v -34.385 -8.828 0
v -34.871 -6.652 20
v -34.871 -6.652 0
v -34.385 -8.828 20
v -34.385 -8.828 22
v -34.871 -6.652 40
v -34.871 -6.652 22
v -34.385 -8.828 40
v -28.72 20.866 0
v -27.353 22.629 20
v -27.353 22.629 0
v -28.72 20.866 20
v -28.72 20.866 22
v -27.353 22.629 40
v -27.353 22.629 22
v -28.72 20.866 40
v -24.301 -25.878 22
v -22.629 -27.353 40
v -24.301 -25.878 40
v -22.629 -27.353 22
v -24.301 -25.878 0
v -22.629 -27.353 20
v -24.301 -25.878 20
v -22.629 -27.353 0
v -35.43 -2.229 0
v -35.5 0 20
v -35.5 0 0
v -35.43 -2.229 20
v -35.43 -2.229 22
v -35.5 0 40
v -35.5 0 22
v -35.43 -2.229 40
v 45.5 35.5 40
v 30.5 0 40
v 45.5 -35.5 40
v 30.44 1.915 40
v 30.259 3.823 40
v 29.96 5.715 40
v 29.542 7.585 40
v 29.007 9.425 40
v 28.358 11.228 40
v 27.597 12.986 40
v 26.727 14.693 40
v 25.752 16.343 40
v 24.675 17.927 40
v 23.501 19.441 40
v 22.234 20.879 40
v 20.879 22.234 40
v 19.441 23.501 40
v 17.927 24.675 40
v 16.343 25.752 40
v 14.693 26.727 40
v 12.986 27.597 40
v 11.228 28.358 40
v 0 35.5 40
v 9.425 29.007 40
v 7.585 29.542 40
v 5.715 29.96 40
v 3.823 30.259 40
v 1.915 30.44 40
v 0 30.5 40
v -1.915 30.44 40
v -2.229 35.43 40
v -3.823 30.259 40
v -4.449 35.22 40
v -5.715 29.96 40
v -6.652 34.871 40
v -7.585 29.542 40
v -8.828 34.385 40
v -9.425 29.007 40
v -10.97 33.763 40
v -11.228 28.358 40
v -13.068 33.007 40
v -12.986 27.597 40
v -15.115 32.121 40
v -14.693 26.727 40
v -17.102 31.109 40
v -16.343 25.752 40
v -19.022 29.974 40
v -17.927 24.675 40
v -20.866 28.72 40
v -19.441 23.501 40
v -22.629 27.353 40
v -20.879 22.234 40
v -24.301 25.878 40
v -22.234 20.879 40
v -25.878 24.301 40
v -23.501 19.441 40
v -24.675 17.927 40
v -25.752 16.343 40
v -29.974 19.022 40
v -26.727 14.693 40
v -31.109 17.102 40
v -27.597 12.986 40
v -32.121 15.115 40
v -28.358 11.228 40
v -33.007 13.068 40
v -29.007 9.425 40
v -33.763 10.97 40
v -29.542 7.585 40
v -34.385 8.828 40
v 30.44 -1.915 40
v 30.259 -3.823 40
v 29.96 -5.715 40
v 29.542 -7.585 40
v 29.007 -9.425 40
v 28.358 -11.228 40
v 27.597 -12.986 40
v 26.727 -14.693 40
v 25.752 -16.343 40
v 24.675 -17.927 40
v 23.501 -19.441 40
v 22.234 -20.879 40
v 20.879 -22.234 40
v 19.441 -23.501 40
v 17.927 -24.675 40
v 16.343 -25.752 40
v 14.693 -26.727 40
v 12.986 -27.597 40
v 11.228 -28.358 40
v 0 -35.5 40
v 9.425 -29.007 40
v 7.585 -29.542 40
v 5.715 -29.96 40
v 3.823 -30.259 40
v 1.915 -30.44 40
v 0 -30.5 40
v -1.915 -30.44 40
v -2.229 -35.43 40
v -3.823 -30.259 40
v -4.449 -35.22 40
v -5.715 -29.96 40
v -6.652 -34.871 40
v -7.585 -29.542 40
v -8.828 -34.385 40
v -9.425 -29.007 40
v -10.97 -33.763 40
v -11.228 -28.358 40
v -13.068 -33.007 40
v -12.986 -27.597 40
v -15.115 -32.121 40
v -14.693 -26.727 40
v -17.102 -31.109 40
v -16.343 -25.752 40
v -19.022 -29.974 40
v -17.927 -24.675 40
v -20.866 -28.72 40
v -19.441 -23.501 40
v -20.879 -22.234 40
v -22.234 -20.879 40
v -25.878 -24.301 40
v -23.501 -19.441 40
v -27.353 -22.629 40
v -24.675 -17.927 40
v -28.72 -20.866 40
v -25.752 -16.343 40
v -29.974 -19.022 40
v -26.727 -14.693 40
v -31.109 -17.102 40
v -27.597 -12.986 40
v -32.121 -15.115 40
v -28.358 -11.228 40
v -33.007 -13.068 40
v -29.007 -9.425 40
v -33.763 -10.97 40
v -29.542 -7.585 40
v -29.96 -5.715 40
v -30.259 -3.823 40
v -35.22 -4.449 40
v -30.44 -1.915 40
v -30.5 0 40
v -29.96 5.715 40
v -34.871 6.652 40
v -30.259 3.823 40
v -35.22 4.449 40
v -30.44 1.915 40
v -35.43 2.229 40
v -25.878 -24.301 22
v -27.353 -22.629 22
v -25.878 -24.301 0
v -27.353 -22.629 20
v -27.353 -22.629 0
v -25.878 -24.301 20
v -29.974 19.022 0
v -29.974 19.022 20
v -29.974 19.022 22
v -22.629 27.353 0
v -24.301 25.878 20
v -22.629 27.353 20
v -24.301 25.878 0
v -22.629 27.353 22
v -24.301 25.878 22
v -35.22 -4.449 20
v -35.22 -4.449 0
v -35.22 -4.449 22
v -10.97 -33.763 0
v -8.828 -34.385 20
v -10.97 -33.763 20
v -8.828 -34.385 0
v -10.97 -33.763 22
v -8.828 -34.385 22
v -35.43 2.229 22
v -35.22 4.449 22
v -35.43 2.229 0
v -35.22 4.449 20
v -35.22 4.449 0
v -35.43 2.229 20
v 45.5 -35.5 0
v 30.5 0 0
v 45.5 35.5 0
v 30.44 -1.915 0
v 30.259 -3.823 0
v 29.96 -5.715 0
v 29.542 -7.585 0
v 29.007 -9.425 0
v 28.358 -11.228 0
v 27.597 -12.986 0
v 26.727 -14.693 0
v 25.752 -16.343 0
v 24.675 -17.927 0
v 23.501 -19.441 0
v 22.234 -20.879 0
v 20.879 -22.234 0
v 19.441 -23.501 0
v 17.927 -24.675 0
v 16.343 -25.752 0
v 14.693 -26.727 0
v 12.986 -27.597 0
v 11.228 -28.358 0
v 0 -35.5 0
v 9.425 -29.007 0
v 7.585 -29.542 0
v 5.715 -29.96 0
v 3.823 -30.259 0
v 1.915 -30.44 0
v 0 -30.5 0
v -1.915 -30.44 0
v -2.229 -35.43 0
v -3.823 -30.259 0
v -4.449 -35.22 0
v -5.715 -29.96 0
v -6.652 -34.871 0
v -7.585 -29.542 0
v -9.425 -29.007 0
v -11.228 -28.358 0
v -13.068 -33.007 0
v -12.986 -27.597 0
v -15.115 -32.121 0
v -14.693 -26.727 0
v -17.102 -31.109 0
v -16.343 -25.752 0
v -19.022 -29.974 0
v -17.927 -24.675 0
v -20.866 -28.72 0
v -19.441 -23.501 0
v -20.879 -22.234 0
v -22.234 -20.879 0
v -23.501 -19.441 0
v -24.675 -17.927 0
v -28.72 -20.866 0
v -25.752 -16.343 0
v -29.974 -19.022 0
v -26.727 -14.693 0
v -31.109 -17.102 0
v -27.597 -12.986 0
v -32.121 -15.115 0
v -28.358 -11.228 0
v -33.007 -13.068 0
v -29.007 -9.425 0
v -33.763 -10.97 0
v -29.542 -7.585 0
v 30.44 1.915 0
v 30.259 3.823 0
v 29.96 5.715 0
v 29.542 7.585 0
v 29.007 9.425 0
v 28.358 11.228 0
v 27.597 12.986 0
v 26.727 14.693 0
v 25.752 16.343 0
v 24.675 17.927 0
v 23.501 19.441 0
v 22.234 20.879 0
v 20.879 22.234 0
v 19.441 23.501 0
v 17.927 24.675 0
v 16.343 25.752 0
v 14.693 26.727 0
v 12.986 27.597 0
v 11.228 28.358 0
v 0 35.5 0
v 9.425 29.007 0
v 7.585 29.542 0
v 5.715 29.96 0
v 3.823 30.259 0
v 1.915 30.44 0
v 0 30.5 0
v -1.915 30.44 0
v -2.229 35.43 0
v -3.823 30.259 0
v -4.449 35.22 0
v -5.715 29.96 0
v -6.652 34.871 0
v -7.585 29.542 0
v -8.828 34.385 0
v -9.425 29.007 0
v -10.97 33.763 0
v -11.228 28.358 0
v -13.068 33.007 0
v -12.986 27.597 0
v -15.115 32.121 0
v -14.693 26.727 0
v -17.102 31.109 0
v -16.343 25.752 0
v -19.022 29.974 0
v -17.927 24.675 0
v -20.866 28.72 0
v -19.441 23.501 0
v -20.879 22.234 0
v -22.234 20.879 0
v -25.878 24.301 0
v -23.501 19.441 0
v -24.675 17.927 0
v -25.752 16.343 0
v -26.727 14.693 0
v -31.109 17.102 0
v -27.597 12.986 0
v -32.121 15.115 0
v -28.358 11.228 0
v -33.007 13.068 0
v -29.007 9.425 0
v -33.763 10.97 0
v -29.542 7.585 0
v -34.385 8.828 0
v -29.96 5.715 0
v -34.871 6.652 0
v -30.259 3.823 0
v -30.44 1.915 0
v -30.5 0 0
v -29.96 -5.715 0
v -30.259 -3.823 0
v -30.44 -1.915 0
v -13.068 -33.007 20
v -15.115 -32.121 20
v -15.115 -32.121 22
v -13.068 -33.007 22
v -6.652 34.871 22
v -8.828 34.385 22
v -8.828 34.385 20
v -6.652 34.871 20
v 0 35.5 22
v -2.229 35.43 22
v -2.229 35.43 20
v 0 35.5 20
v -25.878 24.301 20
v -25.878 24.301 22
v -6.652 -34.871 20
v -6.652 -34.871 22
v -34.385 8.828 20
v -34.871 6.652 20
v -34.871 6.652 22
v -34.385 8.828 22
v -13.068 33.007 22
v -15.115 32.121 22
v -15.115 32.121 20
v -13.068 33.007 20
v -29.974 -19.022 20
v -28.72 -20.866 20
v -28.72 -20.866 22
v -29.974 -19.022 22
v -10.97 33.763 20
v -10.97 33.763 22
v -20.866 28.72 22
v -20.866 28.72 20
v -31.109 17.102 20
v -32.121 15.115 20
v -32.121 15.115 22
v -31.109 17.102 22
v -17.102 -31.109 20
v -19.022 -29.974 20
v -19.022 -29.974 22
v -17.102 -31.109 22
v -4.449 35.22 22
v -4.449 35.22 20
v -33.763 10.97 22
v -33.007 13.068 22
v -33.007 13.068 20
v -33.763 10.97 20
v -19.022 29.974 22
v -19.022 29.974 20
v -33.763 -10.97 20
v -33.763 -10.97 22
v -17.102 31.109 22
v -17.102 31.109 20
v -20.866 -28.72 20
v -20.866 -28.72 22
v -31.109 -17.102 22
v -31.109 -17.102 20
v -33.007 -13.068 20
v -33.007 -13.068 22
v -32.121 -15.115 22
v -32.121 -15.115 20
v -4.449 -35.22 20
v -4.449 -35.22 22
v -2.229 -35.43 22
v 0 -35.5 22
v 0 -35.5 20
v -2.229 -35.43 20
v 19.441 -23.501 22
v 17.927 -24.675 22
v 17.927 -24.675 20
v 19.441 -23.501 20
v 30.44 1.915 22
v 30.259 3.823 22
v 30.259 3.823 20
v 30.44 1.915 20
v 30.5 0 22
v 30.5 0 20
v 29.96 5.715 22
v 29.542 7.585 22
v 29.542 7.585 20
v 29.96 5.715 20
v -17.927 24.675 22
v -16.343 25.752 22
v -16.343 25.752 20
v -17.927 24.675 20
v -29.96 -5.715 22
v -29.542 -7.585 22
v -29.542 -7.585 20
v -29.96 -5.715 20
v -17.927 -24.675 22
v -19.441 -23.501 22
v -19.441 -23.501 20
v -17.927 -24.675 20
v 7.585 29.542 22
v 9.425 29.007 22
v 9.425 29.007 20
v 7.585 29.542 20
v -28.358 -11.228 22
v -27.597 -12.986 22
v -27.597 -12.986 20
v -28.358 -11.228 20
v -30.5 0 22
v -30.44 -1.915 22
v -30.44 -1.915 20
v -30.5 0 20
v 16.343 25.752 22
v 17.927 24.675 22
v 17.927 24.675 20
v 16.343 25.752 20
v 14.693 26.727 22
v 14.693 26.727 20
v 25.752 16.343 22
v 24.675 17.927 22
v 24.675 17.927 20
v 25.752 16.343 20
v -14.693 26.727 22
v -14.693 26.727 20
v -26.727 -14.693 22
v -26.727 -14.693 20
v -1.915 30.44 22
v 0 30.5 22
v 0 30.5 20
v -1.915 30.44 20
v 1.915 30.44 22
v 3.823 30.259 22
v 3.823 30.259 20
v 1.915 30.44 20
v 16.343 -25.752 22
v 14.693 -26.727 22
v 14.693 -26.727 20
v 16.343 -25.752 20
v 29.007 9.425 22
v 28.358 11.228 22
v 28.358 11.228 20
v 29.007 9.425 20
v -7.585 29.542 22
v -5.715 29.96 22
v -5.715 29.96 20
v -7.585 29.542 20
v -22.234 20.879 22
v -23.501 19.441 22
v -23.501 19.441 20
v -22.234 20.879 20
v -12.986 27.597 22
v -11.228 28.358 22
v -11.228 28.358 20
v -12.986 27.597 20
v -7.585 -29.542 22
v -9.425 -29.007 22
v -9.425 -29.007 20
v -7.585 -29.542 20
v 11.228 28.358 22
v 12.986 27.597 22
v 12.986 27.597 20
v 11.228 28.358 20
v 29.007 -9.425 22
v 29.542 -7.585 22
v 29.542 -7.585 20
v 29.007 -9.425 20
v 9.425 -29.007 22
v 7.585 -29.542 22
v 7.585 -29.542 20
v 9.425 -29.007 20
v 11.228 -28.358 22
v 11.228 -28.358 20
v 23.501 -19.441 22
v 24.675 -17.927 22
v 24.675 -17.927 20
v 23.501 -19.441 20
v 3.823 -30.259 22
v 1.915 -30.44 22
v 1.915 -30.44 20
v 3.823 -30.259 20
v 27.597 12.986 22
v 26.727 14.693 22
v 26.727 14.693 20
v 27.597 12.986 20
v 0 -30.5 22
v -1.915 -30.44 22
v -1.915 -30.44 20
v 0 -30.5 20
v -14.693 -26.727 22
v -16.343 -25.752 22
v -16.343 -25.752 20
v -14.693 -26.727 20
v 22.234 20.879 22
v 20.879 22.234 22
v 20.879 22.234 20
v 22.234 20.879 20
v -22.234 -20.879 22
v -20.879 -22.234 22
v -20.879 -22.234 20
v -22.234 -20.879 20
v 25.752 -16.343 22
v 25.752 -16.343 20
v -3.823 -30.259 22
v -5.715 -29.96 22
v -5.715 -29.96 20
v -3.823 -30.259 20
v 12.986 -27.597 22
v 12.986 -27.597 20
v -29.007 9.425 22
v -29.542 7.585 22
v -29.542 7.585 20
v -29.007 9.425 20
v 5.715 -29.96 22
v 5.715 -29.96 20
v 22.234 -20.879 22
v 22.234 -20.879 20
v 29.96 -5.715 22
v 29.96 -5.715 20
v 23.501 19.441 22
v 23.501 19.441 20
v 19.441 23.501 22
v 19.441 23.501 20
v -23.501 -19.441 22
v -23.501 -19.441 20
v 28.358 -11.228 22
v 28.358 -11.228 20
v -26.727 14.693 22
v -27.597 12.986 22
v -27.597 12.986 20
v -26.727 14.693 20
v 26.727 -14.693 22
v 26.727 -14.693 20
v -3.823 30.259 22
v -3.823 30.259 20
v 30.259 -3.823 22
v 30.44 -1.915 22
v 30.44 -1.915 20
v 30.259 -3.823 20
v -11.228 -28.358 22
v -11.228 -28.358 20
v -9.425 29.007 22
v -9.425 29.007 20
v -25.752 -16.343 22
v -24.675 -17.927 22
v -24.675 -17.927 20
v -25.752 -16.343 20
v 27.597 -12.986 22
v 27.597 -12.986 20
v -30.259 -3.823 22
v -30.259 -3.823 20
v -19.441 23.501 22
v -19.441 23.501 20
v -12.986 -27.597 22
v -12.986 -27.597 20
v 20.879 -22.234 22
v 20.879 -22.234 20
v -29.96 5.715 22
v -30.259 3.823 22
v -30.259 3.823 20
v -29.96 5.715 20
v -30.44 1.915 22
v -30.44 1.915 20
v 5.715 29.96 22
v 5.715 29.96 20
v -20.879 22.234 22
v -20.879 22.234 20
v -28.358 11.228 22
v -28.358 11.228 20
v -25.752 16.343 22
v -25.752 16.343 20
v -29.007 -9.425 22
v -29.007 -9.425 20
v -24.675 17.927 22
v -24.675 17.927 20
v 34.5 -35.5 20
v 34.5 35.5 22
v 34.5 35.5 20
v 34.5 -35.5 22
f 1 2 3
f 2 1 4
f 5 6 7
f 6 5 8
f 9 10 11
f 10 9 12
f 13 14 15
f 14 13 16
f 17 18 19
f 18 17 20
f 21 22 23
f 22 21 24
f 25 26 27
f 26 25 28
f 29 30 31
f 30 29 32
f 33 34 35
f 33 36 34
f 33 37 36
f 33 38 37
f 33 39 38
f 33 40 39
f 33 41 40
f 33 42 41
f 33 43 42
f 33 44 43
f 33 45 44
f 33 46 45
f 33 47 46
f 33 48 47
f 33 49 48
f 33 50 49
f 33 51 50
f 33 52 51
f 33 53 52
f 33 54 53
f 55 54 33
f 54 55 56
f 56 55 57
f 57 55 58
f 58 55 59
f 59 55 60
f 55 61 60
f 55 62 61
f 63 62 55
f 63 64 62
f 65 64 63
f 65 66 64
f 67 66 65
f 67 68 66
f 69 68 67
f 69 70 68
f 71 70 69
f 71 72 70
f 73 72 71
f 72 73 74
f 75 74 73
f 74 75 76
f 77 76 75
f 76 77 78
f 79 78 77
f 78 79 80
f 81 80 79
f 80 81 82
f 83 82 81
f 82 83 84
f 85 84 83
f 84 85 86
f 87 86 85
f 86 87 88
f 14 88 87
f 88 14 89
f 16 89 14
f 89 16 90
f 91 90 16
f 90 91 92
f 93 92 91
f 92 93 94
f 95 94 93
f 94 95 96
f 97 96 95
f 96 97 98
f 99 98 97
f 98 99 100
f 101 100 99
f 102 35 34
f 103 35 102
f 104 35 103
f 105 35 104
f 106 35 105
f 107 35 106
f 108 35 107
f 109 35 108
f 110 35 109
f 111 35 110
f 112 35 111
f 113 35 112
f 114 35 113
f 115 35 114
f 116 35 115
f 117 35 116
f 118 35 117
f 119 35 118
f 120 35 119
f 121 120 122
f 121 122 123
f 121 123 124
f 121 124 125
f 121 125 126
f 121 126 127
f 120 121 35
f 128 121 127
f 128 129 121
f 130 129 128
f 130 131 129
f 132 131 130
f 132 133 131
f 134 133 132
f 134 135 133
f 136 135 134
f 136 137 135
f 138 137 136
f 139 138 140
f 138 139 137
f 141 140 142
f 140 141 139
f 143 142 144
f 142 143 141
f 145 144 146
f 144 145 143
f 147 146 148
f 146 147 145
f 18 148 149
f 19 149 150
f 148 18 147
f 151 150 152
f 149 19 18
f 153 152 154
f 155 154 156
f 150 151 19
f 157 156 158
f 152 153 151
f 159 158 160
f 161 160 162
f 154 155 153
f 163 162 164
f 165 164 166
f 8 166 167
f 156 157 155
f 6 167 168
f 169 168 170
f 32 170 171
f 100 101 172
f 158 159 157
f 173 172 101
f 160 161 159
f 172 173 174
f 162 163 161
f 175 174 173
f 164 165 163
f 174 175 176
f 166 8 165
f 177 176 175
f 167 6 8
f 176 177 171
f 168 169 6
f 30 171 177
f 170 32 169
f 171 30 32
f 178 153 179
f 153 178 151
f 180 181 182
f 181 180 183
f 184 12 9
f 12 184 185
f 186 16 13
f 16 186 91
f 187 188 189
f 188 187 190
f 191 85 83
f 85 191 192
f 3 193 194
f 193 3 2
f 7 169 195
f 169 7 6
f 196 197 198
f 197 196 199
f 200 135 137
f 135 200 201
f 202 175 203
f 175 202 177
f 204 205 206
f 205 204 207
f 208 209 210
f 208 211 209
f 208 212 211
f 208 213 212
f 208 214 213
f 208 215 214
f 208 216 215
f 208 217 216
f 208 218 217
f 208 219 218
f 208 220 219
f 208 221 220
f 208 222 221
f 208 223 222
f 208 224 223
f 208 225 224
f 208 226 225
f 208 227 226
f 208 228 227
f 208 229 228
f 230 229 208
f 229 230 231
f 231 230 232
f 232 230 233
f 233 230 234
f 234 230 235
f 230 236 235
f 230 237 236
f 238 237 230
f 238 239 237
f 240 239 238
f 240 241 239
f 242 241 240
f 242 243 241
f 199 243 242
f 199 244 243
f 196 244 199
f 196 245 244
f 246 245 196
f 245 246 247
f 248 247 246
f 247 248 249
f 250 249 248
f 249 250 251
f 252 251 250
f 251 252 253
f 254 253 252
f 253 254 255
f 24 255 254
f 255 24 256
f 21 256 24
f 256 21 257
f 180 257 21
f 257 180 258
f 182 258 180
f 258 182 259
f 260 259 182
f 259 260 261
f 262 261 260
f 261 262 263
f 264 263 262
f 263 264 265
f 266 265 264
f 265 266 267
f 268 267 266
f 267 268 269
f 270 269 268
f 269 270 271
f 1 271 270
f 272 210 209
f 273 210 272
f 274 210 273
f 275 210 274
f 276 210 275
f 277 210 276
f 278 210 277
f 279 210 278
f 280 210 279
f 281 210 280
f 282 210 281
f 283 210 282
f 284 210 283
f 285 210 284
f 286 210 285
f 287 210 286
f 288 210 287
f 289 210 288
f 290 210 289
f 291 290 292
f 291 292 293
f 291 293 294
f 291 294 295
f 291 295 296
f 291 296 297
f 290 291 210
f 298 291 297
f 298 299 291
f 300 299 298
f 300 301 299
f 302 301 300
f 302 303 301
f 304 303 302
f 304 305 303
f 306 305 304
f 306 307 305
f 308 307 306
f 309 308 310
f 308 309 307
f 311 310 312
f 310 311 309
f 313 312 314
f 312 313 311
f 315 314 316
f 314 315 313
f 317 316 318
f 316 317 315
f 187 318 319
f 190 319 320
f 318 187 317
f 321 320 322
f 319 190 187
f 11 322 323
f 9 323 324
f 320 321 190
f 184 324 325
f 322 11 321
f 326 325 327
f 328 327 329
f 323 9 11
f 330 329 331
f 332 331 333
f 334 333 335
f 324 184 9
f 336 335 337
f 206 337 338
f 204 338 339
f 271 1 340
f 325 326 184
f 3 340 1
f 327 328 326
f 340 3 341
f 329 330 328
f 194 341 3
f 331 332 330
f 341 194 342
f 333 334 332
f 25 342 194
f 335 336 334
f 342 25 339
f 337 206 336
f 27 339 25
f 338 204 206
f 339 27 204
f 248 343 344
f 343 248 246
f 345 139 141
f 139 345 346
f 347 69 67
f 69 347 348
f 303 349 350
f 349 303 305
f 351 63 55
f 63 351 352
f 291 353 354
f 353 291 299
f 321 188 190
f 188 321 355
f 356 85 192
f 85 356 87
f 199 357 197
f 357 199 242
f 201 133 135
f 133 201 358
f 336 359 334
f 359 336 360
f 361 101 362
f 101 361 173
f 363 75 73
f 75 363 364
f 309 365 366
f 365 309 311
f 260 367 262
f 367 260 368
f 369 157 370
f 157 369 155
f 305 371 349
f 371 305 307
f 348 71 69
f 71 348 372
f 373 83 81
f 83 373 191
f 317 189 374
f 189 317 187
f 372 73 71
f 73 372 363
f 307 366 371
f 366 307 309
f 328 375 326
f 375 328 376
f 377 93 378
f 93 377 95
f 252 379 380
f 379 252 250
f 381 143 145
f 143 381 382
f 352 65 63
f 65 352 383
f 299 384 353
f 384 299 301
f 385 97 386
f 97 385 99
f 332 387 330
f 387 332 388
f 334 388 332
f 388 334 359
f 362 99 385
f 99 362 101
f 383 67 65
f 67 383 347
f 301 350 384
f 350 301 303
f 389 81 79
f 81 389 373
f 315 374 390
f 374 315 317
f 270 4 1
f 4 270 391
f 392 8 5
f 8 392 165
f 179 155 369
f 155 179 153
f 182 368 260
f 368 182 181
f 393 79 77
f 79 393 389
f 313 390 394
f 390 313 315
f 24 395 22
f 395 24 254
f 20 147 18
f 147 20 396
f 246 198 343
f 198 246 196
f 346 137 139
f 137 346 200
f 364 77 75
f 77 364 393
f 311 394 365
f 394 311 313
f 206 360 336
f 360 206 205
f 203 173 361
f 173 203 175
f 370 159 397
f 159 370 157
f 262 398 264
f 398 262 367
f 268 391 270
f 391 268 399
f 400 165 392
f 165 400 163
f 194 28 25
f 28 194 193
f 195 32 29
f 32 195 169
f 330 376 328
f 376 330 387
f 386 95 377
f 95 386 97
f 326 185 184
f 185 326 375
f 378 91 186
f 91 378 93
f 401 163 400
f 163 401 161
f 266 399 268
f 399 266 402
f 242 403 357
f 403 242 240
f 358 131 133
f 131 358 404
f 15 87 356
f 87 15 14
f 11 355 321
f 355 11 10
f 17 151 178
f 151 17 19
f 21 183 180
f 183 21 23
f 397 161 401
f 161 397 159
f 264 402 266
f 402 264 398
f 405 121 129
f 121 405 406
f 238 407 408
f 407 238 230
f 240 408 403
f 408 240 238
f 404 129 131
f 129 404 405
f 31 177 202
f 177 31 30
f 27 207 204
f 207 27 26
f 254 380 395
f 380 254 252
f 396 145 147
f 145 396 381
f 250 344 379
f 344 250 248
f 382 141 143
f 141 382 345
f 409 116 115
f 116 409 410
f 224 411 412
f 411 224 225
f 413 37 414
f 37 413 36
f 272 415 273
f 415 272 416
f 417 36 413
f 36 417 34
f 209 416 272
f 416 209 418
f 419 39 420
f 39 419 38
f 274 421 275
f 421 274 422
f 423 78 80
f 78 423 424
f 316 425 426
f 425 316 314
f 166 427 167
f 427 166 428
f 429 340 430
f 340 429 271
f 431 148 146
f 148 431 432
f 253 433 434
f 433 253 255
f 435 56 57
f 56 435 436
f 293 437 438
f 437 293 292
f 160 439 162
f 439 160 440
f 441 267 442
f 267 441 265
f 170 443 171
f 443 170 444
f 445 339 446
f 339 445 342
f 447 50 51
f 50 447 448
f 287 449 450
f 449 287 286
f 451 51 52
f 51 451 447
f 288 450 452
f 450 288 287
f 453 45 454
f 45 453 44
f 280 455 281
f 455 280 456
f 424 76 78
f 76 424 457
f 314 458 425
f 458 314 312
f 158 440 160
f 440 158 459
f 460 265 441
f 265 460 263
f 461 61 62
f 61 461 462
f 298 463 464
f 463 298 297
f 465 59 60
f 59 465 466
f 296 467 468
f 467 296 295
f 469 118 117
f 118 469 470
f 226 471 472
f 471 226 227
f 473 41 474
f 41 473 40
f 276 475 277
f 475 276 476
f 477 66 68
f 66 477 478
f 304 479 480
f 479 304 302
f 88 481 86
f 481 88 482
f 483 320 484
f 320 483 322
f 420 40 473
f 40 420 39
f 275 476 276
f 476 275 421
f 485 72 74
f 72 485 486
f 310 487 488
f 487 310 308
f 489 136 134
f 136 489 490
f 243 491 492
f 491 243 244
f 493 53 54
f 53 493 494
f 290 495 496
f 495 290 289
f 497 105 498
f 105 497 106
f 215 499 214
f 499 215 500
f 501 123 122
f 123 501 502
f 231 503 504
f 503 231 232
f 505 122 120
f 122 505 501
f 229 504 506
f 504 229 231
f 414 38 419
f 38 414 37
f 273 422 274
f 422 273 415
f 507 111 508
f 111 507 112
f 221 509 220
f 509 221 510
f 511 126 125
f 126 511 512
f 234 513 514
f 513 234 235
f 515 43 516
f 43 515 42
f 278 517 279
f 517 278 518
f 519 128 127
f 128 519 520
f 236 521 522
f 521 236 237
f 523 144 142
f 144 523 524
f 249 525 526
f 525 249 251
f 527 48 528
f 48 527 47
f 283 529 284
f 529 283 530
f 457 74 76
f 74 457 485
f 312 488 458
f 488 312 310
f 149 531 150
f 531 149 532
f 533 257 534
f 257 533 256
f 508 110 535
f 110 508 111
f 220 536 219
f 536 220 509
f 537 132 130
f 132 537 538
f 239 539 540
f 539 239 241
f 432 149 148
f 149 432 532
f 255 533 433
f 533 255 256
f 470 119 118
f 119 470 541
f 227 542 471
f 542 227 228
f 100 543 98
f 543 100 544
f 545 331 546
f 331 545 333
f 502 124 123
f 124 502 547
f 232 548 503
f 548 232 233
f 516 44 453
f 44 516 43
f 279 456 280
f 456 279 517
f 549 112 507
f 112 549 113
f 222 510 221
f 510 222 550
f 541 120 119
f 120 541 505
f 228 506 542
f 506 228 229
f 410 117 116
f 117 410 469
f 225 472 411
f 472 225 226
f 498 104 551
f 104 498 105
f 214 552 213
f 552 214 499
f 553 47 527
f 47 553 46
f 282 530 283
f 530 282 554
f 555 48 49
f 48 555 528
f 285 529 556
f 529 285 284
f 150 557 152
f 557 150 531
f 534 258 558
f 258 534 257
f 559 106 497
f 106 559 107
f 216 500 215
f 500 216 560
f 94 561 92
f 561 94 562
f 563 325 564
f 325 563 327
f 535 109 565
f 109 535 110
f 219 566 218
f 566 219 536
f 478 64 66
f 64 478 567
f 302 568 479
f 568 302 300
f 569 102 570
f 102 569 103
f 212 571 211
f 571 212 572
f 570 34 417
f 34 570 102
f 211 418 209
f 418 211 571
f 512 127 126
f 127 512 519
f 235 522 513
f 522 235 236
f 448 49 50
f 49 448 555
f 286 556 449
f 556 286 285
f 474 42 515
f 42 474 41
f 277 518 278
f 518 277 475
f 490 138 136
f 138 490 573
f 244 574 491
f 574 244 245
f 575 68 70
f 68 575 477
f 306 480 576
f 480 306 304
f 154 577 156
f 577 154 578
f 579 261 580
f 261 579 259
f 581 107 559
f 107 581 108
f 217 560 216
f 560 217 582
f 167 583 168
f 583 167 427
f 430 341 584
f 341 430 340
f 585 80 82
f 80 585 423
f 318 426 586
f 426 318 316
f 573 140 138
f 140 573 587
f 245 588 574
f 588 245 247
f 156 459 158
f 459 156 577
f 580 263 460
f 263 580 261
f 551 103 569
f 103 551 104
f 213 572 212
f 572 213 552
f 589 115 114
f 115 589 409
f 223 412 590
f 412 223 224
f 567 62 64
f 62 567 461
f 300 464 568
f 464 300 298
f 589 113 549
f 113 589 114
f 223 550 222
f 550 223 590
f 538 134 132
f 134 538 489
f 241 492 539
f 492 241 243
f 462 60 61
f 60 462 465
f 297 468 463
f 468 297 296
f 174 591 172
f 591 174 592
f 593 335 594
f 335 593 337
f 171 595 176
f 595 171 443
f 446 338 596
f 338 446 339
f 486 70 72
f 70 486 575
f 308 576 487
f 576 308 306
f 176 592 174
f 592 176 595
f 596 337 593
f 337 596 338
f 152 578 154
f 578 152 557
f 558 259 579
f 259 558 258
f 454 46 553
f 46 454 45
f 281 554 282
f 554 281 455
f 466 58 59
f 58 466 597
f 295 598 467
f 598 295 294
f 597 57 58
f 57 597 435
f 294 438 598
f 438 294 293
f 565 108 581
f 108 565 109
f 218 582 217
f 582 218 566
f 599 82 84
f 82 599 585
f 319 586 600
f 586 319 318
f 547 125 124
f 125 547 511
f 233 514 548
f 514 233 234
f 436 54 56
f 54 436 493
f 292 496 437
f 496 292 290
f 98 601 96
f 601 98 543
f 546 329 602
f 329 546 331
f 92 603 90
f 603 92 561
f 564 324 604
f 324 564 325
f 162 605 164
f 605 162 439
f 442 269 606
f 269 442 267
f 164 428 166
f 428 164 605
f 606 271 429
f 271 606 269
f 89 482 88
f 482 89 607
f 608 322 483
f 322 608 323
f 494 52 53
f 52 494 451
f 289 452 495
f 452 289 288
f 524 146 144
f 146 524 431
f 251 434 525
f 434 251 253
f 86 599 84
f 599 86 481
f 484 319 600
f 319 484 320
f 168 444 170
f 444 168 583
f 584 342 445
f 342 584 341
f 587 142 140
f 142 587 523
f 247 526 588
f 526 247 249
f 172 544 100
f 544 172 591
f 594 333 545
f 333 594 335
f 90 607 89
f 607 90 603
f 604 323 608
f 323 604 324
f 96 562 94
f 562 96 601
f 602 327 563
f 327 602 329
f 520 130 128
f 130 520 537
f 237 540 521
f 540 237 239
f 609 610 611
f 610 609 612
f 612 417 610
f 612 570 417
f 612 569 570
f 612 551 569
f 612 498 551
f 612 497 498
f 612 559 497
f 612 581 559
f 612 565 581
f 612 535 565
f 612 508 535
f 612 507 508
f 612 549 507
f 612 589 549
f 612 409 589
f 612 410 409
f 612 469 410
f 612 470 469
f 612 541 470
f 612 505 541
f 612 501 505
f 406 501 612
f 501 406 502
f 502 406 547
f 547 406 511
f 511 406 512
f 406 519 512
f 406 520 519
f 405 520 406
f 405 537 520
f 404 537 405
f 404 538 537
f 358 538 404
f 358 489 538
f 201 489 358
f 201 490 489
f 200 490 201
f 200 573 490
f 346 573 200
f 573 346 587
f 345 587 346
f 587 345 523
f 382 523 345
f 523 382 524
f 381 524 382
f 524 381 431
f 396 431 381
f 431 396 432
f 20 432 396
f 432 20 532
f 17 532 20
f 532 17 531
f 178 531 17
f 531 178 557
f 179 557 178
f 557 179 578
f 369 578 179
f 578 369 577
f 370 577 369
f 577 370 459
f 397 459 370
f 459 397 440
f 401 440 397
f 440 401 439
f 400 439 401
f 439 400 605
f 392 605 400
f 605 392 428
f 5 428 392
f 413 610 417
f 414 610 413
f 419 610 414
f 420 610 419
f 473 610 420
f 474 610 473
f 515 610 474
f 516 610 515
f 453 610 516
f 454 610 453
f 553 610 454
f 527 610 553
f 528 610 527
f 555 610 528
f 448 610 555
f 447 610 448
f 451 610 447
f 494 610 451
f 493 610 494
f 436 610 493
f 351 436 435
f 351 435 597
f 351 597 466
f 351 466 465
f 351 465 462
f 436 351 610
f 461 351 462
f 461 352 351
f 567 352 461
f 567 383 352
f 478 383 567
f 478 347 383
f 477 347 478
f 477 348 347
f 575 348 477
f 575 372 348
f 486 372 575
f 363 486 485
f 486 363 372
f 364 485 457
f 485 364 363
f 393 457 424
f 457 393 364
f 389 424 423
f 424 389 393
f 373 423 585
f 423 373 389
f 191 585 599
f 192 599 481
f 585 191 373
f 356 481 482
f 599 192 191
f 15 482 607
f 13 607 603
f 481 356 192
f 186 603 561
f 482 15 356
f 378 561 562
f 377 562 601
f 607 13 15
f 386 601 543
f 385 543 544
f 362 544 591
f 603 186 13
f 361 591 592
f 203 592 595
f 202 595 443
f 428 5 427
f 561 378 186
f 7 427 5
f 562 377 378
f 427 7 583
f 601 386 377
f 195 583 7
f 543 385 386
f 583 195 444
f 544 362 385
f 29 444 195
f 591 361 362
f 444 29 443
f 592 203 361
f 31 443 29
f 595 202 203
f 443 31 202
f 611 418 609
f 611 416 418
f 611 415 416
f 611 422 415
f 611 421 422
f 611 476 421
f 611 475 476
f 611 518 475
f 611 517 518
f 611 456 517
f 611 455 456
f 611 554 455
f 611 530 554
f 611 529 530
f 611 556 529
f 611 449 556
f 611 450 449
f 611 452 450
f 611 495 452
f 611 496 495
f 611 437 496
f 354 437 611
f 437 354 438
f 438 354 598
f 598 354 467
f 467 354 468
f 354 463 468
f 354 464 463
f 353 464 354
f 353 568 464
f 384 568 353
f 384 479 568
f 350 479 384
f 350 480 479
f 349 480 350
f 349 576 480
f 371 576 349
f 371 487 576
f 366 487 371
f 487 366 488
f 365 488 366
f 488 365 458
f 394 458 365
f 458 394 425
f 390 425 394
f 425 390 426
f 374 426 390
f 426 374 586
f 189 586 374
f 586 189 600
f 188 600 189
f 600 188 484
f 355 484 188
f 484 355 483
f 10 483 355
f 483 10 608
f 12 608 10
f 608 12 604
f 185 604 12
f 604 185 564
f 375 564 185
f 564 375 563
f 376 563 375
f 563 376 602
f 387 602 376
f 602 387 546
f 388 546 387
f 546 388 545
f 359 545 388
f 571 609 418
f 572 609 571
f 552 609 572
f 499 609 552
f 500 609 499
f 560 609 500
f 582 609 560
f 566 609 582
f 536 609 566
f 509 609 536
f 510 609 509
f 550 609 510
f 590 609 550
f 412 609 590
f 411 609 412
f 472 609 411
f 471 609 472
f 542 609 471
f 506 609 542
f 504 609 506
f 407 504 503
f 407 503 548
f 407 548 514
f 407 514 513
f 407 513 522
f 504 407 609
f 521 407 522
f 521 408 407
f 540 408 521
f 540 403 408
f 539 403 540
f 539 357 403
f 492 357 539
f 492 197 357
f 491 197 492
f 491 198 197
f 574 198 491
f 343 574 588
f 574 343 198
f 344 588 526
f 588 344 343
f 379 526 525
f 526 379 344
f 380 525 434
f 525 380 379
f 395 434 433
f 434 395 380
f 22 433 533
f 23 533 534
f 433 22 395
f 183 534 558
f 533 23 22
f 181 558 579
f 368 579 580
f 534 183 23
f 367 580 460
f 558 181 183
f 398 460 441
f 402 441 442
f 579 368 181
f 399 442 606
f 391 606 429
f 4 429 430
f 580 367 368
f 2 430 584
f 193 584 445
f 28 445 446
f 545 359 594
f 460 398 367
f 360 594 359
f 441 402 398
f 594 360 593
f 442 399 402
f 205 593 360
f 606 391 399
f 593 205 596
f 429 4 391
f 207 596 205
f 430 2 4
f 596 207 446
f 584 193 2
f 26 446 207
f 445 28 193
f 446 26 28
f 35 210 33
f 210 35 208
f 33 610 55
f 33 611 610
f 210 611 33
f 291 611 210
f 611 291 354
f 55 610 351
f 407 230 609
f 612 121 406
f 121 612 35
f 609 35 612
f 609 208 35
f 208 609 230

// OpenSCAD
$fn=100;
PR=30.5; //pipe outer radius
WT=PR+5; //Guide outer diameter (wall thickness)
BW=WT*2; //This is for the square base

//Pipe grip
difference(){
    cylinder(40,WT,WT);
    translate([0,0,-1])cylinder(50,PR,PR);
    translate([-PR-6,-WT-5,20])cube([BW,BW+10,2]);}
    
//square base
difference(){
    translate([0,-WT,0])cube([WT+10,BW,40]);
    translate([0,0,-1])cylinder(50,PR,PR);
    translate([-PR-6,-WT-5,20])cube([BW,BW+10,2]);}
